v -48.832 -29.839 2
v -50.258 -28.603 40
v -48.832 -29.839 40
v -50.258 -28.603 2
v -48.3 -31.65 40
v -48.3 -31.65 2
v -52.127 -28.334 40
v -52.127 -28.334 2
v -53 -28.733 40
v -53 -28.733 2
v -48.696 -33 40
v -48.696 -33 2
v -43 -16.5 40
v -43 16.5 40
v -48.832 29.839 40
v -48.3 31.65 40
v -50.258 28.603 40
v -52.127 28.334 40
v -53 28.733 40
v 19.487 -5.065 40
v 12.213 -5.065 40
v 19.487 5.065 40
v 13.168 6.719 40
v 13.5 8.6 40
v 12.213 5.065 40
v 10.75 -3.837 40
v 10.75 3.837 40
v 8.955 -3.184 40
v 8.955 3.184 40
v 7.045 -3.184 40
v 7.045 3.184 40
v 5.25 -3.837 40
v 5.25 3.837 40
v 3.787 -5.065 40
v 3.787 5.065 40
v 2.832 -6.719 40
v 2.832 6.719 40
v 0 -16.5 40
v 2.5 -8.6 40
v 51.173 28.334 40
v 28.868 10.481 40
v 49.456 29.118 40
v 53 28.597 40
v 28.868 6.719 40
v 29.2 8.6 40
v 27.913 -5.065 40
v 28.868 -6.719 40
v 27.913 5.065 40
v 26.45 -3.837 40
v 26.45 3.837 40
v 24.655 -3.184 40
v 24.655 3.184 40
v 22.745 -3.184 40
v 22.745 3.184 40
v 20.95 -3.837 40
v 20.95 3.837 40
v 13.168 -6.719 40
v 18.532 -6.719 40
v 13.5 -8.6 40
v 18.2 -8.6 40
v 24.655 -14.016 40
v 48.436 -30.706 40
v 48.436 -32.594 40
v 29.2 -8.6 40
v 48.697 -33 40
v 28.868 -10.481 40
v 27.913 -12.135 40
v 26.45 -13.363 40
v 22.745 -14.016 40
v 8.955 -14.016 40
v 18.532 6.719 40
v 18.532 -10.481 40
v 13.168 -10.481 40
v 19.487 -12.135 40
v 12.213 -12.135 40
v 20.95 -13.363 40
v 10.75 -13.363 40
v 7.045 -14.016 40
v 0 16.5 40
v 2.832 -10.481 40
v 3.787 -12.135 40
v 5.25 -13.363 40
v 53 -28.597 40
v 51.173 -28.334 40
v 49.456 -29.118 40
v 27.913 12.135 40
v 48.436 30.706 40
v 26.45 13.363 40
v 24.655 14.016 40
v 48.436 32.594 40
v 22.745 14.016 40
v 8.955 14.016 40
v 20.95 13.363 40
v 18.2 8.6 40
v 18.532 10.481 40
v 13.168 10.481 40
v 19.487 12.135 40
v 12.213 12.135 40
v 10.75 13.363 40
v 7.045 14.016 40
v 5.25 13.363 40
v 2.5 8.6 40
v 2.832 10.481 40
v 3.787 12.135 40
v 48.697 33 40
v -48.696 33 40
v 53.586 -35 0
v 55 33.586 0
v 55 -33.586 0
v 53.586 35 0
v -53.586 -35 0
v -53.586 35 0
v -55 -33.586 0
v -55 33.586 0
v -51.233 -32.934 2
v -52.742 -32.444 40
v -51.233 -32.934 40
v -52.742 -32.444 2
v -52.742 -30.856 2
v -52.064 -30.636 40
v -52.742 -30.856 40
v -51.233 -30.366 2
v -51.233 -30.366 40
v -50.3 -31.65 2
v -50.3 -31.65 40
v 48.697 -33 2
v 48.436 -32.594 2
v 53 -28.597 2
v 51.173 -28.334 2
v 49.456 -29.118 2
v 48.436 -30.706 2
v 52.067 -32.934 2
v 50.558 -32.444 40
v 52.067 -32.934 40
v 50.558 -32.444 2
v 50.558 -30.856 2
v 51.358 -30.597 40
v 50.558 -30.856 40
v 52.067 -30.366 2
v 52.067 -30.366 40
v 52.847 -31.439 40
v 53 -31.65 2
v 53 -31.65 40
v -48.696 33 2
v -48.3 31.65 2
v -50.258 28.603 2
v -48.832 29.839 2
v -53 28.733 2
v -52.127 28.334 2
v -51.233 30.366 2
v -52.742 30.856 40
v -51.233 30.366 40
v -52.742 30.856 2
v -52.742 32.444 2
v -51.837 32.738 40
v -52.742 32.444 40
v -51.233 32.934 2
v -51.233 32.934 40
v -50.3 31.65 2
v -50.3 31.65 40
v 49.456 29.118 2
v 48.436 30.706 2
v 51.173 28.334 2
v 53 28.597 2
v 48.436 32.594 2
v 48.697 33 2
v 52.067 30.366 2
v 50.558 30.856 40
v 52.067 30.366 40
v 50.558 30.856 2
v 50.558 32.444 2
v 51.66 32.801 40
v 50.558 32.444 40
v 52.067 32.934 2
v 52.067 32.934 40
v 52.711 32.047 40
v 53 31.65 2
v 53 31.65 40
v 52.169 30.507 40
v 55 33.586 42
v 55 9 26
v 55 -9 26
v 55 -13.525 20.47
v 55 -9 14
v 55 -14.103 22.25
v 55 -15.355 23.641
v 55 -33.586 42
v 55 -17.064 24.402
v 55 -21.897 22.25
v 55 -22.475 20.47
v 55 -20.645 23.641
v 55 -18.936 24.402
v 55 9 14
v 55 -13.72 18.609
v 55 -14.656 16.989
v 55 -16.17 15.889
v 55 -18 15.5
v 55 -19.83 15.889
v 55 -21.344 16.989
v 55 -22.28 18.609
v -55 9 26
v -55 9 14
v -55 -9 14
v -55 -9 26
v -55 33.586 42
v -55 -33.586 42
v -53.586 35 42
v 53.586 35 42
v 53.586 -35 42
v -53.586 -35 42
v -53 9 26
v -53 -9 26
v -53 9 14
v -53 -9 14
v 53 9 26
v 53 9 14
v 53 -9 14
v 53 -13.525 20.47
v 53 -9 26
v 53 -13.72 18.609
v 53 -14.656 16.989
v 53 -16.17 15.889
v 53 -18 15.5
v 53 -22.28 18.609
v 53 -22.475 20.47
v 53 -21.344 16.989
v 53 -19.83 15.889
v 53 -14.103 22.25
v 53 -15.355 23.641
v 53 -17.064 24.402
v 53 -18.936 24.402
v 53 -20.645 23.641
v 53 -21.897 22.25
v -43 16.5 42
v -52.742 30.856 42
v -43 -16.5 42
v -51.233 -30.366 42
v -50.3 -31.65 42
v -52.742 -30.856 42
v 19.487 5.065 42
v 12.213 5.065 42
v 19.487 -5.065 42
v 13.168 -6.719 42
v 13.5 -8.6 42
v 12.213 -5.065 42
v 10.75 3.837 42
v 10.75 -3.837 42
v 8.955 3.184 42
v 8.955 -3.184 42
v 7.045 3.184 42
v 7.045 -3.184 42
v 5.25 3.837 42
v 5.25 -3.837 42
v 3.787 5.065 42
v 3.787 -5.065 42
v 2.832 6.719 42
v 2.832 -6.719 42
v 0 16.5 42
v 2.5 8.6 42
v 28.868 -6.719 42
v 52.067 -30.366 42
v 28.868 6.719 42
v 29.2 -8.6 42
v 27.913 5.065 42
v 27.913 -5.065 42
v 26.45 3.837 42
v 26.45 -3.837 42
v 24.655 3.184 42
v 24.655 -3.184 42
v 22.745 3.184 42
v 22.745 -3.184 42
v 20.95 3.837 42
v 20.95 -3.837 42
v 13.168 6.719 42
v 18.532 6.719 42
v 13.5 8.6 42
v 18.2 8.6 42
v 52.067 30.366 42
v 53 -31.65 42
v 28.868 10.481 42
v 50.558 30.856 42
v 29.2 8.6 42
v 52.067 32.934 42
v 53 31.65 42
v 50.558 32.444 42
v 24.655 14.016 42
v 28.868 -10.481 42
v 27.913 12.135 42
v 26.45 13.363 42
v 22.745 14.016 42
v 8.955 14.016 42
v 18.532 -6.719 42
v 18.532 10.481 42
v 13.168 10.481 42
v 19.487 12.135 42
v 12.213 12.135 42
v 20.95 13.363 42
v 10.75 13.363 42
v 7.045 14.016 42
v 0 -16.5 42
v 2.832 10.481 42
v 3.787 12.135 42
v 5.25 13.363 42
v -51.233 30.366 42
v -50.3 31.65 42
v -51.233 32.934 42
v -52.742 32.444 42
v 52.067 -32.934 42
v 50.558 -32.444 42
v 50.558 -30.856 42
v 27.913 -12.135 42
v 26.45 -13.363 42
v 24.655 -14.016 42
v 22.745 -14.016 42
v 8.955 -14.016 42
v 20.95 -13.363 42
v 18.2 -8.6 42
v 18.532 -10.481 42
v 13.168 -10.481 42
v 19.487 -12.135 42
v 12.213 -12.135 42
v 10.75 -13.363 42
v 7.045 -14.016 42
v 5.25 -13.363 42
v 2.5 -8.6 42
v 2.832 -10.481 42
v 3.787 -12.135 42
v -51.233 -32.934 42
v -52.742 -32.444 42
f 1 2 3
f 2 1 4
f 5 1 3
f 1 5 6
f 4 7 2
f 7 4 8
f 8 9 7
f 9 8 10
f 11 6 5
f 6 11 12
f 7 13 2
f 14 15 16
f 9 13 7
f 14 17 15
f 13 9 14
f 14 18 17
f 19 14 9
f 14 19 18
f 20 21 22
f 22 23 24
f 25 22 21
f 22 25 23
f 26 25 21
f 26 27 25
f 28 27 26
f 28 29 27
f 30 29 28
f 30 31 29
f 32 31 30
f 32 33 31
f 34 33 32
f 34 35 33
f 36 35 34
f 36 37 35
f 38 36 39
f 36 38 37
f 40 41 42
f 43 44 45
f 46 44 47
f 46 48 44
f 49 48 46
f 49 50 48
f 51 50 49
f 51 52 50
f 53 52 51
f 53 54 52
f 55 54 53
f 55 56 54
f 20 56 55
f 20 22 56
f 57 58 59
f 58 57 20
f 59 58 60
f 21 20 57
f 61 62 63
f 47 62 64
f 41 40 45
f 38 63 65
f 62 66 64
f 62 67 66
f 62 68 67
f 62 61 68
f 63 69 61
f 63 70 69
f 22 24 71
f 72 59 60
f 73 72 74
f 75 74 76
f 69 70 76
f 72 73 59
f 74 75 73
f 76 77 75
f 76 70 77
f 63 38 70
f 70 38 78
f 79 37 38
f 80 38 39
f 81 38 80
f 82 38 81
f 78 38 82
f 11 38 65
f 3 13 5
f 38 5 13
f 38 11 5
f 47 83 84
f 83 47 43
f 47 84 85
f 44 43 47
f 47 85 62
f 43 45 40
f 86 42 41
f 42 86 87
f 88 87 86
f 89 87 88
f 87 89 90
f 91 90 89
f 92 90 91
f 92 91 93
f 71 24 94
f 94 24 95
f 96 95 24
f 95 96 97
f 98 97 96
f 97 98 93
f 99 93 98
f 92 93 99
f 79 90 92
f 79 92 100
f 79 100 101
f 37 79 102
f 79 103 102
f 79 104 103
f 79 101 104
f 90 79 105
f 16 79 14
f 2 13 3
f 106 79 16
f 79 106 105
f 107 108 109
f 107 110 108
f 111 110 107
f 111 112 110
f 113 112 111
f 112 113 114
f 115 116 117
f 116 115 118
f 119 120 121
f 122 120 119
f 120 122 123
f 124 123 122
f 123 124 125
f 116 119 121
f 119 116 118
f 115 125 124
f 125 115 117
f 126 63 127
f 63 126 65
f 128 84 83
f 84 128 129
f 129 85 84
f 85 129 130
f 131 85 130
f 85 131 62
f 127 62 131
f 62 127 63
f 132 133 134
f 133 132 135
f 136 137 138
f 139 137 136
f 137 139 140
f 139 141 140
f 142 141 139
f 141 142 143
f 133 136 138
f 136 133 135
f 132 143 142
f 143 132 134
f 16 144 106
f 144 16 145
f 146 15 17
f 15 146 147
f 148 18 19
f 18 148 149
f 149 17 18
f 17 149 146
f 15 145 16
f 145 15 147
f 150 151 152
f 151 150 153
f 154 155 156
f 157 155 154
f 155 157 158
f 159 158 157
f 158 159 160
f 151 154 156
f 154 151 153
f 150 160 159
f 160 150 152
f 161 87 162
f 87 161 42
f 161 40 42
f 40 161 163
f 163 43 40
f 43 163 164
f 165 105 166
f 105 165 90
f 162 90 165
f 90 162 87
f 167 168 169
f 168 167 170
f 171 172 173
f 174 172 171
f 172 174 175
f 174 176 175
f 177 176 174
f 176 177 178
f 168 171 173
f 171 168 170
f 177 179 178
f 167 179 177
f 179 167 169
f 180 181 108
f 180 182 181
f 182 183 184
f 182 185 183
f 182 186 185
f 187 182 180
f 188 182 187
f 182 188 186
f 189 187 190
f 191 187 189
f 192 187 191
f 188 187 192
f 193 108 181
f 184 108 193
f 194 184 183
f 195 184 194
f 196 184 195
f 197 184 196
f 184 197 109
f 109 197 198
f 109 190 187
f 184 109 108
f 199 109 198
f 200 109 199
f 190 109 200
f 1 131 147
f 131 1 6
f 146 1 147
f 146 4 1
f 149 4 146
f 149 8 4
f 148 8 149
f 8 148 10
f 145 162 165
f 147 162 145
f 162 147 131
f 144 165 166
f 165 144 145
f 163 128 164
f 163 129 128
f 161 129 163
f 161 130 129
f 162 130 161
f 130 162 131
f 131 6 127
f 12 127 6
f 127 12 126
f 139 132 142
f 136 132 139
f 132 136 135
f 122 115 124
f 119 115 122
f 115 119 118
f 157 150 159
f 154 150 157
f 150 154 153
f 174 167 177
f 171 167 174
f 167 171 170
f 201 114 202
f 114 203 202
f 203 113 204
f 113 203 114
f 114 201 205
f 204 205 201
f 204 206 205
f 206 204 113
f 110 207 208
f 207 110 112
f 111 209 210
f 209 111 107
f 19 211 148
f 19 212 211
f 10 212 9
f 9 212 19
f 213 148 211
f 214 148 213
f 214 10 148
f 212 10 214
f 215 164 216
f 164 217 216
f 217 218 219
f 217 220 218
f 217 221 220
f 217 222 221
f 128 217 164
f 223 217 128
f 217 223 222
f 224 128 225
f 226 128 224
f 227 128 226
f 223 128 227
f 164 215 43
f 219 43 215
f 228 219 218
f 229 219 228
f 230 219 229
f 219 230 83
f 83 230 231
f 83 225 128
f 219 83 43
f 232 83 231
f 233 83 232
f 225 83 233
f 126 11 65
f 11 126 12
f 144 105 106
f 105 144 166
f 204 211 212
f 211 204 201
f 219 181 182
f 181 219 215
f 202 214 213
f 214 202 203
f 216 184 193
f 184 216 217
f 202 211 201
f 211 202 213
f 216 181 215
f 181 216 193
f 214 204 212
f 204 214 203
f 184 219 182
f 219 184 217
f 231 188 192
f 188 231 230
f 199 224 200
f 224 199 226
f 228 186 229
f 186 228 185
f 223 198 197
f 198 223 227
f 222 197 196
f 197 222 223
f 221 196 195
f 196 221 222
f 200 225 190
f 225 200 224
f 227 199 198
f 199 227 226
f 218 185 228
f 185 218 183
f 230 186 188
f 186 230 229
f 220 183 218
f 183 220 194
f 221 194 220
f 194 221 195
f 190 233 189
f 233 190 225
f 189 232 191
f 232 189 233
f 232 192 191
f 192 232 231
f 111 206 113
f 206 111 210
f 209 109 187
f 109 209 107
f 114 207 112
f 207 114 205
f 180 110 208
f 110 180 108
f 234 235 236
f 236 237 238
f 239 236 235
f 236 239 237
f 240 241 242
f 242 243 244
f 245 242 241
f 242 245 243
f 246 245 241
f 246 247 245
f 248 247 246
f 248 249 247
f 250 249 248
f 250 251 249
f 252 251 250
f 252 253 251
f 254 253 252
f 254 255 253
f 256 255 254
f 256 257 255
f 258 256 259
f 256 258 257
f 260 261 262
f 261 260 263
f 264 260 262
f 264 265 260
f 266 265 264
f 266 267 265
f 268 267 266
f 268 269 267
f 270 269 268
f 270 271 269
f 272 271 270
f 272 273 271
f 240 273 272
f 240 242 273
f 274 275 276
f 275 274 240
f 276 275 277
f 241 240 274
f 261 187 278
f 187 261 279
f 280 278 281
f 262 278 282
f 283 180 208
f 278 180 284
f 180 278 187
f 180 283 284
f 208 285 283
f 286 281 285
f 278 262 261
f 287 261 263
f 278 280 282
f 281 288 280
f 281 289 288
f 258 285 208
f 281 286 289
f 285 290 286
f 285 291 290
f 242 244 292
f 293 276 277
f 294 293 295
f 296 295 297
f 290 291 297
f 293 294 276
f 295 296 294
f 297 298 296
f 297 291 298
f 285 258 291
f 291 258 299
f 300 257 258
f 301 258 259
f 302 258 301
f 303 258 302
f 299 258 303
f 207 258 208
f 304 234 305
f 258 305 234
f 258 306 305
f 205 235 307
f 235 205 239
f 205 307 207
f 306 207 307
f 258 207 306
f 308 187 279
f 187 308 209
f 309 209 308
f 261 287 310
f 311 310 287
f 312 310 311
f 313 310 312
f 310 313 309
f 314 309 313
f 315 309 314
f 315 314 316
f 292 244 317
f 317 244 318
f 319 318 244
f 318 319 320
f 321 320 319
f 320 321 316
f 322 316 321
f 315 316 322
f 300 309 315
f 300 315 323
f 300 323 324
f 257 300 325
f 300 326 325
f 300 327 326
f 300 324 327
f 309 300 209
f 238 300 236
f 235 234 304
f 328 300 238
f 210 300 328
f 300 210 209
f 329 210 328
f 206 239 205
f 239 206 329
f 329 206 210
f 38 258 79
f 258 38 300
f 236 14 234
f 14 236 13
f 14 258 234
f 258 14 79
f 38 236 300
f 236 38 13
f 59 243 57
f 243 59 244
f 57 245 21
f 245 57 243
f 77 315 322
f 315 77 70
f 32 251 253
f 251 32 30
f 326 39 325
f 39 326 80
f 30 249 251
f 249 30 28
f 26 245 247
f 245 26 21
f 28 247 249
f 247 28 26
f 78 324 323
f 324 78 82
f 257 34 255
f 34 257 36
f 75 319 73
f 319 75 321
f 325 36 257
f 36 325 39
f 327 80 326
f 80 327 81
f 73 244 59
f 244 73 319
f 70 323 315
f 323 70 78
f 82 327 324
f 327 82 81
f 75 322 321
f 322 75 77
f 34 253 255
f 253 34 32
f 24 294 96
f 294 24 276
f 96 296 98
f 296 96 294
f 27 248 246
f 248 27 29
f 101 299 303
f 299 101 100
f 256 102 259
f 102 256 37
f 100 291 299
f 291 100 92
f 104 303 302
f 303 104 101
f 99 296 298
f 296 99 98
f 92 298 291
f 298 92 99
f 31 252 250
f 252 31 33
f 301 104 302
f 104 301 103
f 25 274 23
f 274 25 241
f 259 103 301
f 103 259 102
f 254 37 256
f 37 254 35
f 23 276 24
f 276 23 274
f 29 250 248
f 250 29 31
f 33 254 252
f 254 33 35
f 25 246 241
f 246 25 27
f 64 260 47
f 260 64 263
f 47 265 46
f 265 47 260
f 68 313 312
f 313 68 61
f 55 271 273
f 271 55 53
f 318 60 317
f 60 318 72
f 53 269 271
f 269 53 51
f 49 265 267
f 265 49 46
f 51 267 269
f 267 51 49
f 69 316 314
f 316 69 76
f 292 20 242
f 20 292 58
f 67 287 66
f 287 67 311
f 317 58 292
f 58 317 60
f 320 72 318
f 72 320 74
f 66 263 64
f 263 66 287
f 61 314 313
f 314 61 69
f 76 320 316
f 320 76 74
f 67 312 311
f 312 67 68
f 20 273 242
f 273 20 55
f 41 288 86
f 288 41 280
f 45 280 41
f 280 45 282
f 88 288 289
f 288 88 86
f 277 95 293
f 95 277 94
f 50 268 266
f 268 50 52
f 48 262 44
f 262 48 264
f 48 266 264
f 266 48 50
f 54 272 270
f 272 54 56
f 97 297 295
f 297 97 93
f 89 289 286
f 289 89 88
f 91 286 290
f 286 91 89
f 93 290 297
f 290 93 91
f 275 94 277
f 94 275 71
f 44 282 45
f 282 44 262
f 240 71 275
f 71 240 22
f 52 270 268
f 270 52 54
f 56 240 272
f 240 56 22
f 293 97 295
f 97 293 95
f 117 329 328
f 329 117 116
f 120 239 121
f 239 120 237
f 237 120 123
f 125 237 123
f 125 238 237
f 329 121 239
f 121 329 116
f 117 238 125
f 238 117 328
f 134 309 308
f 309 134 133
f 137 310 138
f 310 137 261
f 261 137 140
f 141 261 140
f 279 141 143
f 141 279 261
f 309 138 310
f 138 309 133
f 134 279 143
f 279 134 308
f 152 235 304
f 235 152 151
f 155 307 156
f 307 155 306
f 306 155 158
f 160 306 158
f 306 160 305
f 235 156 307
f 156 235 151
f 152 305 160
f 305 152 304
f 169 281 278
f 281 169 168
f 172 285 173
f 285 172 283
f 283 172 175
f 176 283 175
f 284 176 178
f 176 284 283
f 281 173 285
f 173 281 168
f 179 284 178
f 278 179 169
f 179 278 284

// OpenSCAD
/* vim: set ai et ts=4 sw=4: */
// http://www.openscad.org/cheatsheet/

width = 110;
depth = 70;
height = 40; // real enclosure hight will be height+thickness
thickness = 2;
hole_dia = 2.7;
xt60_width = 18;
xt60_height = 12;
thermocouple_dia = 9;
st7735_width = 43;
st7735_height = 33;
st7735_offset = 12;
button_offset = 2.5;
button_dia = 11;
button_h_space = 15.7;
button_v_space = 17.2;

stand_width = 20;
stand_height = 7;

render_bottom_part = true;
render_top_part = true;
render_bottom_part_b_stand = false;

cut_bottom_part_a = false;
cut_bottom_part_b = false;

module bottom_screw_hole(x, y) {
    translate([x, y, 0]) {
        difference() {
            cylinder(h=height, d=hole_dia+thickness*2);
            cylinder(h=height, d=hole_dia);
        }
    }
}

module top_screw_hole(x, y) {
    translate([x, y, -height/2]) {
        cylinder(h=height, d=hole_dia);
    }
}

module button_hole(x_off, y_off) {
    translate([st7735_offset+st7735_width+
               button_offset+button_dia/2+x_off,
               depth/2 + y_off,
               -thickness]) {
        cylinder(h=thickness*3, d = button_dia);
    }
}

module bottom_part_base() {
    union() {
        // bottom
        cube([width, depth, thickness]);
        // left wall
        cube([thickness, depth, height]);
        // right wall
        translate([width-thickness, 0, 0]) {
            cube([thickness, depth, height]);
        }
        // front wall
        cube([width, thickness, height]);
        // back wall
        translate([0, depth-thickness, 0]) {
            cube([width, thickness, height]);
        }

        bottom_screw_hole(hole_dia/2+thickness, hole_dia/2+thickness);
        bottom_screw_hole(width-hole_dia/2-thickness, hole_dia/2+thickness);
        bottom_screw_hole(hole_dia/2+thickness, depth-hole_dia/2-thickness);
        bottom_screw_hole(width-hole_dia/2-thickness, depth-hole_dia/2-thickness);
    }
}

module cut_corner(x, y, angle) {
    translate([x, y, height/2]) {
        rotate([0, 0, angle]) rotate([0,-90,0]) {
            cube([height*1.2, height, thickness], true);
        }
    }
}
 
translate([-width/2, -depth/2, 0]) {
    // bottom part of the enclosure
    if(render_bottom_part) {
        difference() {
            bottom_part_base();
            // cut two holes for XT60 connectors
            translate([-width*0.1,
                       (depth-xt60_width)/2,
                       (height-xt60_height)/2]) {
                cube([width*1.2, xt60_width, xt60_height]);
            }

            // cut a hole for a thermocouple
            translate([width*0.9,
                       -thermocouple_dia + ((depth-xt60_width)/2),
                       height/2]) {
                rotate([0,90,0]) {
                    cylinder(h=width*0.2, d = thermocouple_dia); 
                }
            }

            // "round" corners
            cut_corner(0, 0, 45);
            cut_corner(width, 0, -45);
            cut_corner(0, depth, -45);
            cut_corner(width, depth, 45);

            if(cut_bottom_part_a) {
                translate([0, 0, (height-xt60_height)/2])
                    cube([width, depth, height - (height-xt60_height)/2]);
            }

            if(cut_bottom_part_b) {
                cube([width, depth, (height-xt60_height)/2]);
            }

        }
    } // if

    if(render_bottom_part_b_stand) {
        translate([-stand_width/4, -stand_width/4, height]) {
            difference() {
                cube([width+stand_width/2, depth+stand_width/2, stand_height]);
                translate([stand_width/2, stand_width/2, 0])
                    cube([width-stand_width/2, depth-stand_width/2, stand_height]);
            }
        }
    } // if

    if(render_top_part) {
        translate([0, 0, height]) difference() {
            // base
            cube([width, depth, thickness]);

            // hole for ST7735
            translate([st7735_offset,
                      (depth-st7735_height)/2,
                      -thickness]) {
                cube([st7735_width, st7735_height, thickness*3]);


            }

            // "round" corners
            cut_corner(0, 0, 45);
            cut_corner(width, 0, -45);
            cut_corner(0, depth, -45);
            cut_corner(width, depth, 45);

            // button holes
            button_hole(0, -button_v_space/2);
            button_hole(0, button_v_space/2);
            button_hole(button_h_space, -button_v_space/2);
            button_hole(button_h_space, button_v_space/2);

            // screw holes
            top_screw_hole(hole_dia/2+thickness, hole_dia/2+thickness);
            top_screw_hole(width-hole_dia/2-thickness, hole_dia/2+thickness);
            top_screw_hole(hole_dia/2+thickness, depth-hole_dia/2-thickness);
            top_screw_hole(width-hole_dia/2-thickness, depth-hole_dia/2-thickness);
            
       } // translate, difference
    } // if

}
